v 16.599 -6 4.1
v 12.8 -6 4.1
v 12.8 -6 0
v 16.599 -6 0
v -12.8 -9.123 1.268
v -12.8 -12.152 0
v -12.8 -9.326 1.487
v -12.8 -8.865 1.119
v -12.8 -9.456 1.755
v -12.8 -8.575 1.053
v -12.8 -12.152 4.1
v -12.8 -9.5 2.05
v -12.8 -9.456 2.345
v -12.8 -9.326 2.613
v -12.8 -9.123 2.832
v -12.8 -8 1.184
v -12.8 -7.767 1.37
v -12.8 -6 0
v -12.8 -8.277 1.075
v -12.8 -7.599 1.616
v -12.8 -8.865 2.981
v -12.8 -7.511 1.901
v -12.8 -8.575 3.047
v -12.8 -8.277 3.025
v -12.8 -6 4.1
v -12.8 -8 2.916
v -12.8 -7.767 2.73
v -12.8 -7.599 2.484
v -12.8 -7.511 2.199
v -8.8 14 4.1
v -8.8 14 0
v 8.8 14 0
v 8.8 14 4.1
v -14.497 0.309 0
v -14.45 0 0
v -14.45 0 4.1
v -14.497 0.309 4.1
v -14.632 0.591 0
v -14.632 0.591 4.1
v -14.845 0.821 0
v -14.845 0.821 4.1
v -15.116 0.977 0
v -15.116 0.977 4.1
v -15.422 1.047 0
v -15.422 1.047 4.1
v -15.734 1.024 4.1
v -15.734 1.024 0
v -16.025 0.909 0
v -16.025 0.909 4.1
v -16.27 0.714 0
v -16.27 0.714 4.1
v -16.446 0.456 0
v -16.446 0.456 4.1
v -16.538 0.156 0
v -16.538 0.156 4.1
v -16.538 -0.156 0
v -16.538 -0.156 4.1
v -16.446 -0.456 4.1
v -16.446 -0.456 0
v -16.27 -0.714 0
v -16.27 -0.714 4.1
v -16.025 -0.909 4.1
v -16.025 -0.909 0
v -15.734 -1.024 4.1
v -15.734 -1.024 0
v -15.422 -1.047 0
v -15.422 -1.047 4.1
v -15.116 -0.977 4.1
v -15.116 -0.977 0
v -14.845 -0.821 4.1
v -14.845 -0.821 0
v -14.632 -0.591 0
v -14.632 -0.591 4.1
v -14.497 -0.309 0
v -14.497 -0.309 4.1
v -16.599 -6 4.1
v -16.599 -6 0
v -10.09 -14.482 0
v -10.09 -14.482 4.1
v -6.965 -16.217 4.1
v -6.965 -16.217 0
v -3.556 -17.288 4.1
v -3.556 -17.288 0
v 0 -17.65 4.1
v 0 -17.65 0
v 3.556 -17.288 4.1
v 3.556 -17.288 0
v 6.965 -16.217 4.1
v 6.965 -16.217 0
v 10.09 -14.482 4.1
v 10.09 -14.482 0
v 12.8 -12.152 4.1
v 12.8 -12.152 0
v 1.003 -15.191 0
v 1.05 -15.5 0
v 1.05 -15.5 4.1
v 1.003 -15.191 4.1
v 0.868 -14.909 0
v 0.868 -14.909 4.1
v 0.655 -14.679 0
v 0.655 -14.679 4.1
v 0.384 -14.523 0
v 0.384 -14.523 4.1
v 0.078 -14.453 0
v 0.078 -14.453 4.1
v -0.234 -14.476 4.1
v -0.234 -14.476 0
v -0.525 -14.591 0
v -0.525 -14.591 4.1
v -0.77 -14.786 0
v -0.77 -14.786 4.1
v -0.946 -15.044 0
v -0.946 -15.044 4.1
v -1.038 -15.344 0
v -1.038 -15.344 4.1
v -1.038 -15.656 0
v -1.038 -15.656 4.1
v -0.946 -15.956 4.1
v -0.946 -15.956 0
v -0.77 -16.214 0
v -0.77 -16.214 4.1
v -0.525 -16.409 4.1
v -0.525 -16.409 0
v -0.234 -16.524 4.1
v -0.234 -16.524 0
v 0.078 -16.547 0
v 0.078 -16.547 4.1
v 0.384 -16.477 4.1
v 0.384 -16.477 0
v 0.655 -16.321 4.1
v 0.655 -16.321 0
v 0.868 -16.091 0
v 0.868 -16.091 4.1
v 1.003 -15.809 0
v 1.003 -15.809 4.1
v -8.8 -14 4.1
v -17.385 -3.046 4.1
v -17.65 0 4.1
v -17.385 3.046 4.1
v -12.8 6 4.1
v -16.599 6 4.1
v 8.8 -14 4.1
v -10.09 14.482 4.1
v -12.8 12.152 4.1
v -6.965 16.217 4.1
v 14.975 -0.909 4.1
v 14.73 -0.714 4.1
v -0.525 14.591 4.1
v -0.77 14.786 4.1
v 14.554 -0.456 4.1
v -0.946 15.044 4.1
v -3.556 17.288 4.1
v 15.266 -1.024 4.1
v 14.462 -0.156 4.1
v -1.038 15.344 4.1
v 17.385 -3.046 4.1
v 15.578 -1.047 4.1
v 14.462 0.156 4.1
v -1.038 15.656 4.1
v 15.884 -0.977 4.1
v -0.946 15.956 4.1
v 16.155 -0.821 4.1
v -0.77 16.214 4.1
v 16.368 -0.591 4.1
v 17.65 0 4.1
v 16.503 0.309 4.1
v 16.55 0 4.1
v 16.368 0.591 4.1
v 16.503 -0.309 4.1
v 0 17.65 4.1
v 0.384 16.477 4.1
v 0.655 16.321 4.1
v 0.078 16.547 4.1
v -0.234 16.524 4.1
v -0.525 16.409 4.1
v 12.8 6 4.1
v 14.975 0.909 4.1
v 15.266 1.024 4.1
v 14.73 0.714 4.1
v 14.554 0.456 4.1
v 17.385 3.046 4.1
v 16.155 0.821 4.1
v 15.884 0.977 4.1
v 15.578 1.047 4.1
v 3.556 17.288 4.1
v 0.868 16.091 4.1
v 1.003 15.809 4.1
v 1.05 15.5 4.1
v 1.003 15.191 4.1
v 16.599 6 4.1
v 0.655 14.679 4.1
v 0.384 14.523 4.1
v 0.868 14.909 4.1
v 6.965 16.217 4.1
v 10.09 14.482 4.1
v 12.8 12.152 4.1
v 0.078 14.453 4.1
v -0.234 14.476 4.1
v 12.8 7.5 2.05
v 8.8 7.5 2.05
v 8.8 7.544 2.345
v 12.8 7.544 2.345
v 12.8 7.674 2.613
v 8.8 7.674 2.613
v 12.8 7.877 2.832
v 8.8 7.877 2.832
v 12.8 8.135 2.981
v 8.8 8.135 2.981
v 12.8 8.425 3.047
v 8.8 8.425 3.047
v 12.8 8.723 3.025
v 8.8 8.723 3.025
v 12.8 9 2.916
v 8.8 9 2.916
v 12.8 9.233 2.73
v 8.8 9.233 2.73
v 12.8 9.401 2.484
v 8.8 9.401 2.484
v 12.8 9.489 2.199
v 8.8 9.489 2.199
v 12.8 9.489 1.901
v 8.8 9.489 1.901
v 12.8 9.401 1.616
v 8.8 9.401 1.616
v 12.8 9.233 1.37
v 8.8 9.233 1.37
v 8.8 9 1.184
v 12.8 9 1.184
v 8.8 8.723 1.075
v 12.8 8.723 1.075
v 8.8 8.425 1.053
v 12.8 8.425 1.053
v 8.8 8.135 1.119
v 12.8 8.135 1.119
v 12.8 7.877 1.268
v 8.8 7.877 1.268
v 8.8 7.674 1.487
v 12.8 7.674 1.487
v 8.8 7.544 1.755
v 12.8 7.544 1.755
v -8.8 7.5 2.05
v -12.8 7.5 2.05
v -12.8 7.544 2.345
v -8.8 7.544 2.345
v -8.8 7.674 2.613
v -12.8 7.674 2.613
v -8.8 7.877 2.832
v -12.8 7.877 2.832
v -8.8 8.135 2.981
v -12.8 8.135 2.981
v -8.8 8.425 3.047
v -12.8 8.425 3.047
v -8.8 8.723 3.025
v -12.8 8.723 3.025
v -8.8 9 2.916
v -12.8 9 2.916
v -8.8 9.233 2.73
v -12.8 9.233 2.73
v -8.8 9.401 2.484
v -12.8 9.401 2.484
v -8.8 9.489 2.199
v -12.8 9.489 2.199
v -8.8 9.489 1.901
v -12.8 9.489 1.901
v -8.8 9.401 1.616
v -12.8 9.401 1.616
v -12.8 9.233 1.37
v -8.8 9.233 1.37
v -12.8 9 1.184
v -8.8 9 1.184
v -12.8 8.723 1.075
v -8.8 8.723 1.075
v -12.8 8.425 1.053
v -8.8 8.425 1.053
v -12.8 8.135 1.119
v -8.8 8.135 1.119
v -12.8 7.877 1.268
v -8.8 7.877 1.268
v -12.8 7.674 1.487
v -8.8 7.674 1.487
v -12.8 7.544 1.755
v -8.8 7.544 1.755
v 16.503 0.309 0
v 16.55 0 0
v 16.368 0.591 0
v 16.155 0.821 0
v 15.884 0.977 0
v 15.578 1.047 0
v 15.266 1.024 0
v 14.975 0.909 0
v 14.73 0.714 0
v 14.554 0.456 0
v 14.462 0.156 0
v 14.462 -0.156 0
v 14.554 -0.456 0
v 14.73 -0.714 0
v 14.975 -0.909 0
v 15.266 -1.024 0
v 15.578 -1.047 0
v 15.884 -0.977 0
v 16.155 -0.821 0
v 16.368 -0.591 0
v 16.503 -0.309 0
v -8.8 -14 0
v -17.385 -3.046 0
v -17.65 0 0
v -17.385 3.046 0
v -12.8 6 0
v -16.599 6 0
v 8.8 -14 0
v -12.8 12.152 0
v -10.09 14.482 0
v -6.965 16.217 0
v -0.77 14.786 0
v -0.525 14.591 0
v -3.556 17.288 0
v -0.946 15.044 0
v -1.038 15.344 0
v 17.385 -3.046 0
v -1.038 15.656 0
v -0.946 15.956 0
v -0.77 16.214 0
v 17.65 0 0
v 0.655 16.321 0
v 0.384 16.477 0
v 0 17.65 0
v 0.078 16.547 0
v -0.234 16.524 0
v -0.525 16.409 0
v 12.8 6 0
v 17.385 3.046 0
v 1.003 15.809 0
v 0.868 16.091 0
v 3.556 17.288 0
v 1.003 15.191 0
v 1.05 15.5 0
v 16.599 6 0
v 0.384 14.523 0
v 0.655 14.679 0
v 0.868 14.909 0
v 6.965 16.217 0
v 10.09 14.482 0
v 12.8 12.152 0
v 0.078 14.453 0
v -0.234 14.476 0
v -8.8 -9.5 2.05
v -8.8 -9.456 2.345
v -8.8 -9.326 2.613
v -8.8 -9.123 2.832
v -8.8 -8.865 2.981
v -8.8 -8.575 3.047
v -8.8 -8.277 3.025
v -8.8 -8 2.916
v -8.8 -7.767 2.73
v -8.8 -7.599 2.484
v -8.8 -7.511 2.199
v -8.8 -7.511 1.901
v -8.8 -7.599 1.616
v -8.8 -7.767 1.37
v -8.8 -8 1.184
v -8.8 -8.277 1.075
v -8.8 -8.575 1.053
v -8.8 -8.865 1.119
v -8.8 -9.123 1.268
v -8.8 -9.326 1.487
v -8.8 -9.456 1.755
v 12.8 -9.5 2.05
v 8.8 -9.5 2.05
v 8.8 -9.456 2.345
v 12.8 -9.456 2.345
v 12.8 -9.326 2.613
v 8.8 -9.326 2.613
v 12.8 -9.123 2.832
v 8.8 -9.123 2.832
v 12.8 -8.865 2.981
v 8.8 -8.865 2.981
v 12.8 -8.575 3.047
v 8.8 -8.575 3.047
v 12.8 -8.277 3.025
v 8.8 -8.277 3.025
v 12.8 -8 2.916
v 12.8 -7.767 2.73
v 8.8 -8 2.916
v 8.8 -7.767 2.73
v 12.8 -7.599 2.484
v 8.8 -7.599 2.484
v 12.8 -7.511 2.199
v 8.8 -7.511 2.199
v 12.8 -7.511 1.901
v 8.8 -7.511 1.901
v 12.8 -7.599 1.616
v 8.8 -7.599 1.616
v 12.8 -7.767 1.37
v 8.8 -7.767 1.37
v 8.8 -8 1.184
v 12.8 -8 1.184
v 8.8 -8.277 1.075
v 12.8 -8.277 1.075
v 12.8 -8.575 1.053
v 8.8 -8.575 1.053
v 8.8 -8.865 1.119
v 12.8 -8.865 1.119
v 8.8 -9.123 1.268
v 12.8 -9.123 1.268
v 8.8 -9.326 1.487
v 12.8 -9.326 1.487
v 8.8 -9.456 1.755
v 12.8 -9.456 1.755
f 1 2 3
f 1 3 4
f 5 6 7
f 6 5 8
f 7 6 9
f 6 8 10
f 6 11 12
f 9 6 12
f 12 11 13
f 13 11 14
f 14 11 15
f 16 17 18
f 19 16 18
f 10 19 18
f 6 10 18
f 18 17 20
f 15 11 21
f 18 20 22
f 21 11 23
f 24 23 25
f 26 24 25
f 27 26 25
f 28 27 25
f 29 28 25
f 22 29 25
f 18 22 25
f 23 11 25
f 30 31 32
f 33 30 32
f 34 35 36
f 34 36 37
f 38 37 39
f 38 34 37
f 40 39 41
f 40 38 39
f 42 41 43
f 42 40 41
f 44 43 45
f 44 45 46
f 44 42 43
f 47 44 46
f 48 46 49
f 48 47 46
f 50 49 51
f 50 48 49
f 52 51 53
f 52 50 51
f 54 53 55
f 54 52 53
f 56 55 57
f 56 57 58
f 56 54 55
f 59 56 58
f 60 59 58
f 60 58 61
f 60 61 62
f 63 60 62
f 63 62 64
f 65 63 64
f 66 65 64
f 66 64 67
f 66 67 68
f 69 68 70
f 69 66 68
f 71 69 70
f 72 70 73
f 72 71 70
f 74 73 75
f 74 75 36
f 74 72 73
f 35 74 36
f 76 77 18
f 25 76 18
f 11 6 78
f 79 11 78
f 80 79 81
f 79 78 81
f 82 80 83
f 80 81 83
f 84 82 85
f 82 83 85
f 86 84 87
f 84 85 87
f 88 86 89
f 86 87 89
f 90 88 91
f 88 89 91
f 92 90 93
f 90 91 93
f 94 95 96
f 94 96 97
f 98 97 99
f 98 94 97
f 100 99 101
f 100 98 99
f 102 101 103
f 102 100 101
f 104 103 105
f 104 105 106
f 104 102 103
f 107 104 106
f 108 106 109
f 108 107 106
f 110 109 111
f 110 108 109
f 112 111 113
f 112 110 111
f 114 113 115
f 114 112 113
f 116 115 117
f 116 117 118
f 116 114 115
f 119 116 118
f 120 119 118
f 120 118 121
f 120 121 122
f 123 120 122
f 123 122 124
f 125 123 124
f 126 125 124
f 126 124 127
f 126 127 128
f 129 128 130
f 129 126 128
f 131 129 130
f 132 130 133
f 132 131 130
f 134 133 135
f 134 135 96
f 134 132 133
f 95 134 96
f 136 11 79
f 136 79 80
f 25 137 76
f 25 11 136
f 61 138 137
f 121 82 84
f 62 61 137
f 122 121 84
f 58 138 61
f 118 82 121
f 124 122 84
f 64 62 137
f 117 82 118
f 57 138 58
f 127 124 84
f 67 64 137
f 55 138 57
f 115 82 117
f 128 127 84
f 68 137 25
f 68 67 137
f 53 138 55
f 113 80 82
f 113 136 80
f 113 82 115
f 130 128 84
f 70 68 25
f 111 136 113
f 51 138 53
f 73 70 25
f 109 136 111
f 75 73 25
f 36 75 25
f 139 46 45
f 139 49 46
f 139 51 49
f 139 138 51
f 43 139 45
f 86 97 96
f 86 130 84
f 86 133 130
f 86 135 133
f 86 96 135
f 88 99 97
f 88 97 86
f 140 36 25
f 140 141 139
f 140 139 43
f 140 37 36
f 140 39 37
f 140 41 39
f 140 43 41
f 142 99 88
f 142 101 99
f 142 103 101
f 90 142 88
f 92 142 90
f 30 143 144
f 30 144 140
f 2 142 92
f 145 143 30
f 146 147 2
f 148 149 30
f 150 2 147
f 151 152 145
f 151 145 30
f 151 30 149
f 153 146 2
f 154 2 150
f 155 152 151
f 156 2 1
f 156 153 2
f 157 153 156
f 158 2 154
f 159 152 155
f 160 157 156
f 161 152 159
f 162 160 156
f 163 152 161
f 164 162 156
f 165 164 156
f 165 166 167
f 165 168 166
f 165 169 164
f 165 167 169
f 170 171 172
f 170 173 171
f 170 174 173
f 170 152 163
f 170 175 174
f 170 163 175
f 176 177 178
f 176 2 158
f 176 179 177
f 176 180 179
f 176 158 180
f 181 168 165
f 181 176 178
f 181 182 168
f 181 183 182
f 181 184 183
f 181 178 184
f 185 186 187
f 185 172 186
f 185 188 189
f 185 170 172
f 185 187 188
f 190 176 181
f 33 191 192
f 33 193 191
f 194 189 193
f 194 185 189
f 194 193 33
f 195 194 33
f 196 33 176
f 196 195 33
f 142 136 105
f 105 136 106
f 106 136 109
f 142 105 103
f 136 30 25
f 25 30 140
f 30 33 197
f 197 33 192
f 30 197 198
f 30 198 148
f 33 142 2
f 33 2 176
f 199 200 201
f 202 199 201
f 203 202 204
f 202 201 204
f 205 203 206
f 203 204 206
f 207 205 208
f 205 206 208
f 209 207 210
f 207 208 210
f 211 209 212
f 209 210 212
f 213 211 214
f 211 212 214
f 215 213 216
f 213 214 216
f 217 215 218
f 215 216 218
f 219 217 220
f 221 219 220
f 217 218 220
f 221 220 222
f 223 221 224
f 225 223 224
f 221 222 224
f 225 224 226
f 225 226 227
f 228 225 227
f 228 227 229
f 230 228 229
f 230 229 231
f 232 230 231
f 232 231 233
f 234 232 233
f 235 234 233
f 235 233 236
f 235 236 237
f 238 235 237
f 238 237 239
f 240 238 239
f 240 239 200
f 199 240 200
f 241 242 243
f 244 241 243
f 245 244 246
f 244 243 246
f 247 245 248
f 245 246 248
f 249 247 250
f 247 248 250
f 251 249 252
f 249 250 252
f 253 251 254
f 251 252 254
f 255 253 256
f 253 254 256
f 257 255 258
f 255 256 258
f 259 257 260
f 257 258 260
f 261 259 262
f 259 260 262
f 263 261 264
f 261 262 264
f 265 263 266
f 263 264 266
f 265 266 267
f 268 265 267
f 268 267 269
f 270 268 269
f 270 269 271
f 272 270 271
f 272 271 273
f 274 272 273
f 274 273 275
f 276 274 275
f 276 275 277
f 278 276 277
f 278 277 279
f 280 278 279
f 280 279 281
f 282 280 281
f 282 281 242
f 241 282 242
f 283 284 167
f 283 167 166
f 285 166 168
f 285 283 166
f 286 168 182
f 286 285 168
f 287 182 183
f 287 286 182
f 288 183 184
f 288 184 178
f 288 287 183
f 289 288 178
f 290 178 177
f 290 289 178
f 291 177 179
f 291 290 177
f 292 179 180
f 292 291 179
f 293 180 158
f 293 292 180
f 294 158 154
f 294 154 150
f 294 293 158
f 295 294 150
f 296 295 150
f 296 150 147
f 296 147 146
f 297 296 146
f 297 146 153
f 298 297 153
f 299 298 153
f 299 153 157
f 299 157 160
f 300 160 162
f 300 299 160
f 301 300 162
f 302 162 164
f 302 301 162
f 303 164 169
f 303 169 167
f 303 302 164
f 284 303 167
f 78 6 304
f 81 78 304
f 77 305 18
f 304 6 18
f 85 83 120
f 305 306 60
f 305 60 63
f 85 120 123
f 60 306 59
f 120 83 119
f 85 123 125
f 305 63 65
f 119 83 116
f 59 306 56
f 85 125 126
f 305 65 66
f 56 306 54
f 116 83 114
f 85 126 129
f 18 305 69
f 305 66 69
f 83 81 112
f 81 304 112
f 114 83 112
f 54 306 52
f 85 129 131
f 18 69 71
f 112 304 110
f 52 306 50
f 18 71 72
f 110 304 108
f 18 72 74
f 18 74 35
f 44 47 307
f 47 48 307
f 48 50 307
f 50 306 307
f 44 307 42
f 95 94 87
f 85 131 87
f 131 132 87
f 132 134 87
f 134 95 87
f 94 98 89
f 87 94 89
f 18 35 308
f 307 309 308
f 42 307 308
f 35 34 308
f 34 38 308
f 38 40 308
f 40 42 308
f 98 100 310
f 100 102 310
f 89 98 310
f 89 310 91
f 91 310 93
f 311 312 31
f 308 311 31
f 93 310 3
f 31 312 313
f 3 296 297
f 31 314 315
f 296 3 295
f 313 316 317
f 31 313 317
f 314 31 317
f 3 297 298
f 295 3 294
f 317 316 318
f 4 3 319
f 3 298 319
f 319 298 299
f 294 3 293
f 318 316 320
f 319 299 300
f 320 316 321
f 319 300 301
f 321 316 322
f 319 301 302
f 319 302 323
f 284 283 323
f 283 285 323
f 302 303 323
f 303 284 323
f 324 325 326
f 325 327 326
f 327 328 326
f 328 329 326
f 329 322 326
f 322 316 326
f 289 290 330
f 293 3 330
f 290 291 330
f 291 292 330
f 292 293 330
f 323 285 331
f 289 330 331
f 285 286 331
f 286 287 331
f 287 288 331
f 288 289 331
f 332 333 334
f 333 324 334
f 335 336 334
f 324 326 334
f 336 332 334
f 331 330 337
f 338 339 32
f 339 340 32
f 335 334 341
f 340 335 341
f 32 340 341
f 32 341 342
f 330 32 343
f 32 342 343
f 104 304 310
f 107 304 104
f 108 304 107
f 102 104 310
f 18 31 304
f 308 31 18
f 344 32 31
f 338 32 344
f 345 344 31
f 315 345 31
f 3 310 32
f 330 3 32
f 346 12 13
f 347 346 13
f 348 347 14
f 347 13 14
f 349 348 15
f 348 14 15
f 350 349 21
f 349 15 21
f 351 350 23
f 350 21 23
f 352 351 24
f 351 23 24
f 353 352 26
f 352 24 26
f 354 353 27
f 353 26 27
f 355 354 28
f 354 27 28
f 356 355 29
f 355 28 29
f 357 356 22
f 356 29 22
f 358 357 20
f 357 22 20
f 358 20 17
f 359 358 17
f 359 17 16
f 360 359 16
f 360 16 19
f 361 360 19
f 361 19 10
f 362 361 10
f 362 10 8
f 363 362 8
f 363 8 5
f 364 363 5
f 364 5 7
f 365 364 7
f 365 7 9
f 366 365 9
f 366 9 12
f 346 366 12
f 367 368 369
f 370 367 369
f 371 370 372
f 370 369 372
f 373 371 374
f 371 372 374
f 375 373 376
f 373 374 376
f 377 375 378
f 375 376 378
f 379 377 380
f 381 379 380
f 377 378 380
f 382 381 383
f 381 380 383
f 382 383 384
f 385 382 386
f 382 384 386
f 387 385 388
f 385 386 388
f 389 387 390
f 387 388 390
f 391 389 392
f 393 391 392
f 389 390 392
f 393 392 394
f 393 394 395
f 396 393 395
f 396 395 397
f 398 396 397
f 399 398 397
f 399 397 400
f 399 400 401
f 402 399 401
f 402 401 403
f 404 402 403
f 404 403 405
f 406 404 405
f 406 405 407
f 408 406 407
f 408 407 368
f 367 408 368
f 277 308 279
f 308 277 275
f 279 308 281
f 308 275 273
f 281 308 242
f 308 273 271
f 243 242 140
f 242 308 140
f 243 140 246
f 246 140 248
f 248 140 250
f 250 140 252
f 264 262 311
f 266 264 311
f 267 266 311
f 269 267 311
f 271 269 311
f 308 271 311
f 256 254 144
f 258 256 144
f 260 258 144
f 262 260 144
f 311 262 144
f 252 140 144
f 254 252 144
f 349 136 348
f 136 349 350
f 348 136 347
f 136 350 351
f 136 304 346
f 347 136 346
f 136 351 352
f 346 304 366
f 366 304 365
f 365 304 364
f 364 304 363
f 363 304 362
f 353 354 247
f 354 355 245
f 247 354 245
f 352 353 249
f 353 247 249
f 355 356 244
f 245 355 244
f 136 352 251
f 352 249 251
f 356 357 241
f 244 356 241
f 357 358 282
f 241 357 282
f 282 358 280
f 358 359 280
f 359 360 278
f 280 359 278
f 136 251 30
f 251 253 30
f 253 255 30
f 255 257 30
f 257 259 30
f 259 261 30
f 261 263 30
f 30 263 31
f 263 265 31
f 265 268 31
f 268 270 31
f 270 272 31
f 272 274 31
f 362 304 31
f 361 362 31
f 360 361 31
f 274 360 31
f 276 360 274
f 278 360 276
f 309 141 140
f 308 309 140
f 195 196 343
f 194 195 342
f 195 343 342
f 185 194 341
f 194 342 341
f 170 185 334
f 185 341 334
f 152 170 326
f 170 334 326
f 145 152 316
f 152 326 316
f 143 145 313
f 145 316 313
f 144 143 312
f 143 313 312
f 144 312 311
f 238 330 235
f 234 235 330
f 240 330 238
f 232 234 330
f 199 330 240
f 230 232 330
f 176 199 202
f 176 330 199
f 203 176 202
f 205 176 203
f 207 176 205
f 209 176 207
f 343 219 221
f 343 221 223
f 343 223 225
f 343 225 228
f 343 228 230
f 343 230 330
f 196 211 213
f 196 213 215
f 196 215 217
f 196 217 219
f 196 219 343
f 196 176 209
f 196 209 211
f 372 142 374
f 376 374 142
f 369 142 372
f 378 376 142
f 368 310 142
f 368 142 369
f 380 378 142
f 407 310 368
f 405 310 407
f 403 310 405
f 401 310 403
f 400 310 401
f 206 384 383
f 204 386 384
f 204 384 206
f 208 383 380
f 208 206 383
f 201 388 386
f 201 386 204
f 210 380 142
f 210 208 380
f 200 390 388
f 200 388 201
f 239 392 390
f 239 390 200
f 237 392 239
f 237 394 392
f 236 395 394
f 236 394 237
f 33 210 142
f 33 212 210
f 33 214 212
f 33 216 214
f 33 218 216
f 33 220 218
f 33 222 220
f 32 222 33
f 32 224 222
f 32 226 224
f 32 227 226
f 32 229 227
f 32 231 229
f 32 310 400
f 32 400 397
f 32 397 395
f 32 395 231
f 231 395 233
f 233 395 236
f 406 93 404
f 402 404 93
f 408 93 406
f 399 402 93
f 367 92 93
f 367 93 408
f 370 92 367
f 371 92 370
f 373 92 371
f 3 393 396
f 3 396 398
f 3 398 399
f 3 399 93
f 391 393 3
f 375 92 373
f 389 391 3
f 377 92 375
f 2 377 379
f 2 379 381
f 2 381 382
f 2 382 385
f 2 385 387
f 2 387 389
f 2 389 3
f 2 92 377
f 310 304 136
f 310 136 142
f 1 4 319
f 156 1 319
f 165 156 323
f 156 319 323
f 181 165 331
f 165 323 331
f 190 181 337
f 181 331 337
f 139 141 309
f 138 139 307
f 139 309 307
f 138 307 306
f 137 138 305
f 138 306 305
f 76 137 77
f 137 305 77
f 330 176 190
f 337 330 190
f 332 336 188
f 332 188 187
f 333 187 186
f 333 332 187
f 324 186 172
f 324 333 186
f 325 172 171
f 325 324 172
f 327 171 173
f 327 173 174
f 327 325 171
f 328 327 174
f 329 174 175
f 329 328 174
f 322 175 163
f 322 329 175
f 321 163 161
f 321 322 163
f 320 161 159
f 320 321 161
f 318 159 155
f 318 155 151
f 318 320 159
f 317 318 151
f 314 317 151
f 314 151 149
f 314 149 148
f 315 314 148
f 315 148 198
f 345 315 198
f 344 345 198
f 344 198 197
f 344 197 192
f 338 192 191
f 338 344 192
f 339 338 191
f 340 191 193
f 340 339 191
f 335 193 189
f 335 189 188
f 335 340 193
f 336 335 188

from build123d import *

# Parameters (mm, degrees)
F0_R     = 17.65
F0_R_2   = 1.05
F0_W     = 17.6
F0_H     = 28
F1_DEPTH = 4.1
F2_W     = 8.4405994534
F2_H     = 9.594688829
F2_W_2   = 9.8450831422
F2_H_2   = 12.0924381804
F2_W_3   = 11.2190096889
F2_H_3   = 12.7369980328
F2_W_4   = 11.1257450883
F3_DEPTH = 4.101
F4_R     = 1
F5_DEPTH = 30.451


with BuildPart() as f1:
    # F0 (on Top) → F1 (new body)
    with BuildSketch(Plane.XY):
        Circle(F0_R)
        with Locations((0, -15.5)):
            Circle(F0_R_2, mode=Mode.SUBTRACT)
        with Locations((-15.5, 0)):
            Circle(F0_R_2, mode=Mode.SUBTRACT)
        Rectangle(F0_W, F0_H, mode=Mode.SUBTRACT)
        with Locations((15.5, 0)):
            Circle(F0_R_2, mode=Mode.SUBTRACT)
        with Locations((0, 15.5)):
            Circle(F0_R_2, mode=Mode.SUBTRACT)
    extrude(amount=F1_DEPTH)

    # F2 (on face) → F3 (cut, through all)
    with BuildSketch(Plane.XY.offset(4.1)):
        with Locations((-17.0202997267, 10.7973444145)):
            Rectangle(F2_W, F2_H)
        with Locations((17.7225415711, 12.0462190902)):
            Rectangle(F2_W_2, F2_H_2)
        with Locations((18.4095048444, -12.3684990164)):
            Rectangle(F2_W_3, F2_H_3)
        with Locations((-18.3628725441, -12.3684990164)):
            Rectangle(F2_W_4, F2_H_3)
    extrude(amount=-F3_DEPTH, mode=Mode.SUBTRACT)

    # F4 (on face) → F5 (cut, through all)
    with BuildSketch(Plane(origin=(-12.8, 0, 0), x_dir=(0, -1, 0), z_dir=(-1, 0, 0))):
        with Locations((-8.5, 2.05)):
            Circle(F4_R)
        with Locations((8.5, 2.05)):
            Circle(F4_R)
    extrude(amount=-F5_DEPTH, mode=Mode.SUBTRACT)


solid = f1.part
